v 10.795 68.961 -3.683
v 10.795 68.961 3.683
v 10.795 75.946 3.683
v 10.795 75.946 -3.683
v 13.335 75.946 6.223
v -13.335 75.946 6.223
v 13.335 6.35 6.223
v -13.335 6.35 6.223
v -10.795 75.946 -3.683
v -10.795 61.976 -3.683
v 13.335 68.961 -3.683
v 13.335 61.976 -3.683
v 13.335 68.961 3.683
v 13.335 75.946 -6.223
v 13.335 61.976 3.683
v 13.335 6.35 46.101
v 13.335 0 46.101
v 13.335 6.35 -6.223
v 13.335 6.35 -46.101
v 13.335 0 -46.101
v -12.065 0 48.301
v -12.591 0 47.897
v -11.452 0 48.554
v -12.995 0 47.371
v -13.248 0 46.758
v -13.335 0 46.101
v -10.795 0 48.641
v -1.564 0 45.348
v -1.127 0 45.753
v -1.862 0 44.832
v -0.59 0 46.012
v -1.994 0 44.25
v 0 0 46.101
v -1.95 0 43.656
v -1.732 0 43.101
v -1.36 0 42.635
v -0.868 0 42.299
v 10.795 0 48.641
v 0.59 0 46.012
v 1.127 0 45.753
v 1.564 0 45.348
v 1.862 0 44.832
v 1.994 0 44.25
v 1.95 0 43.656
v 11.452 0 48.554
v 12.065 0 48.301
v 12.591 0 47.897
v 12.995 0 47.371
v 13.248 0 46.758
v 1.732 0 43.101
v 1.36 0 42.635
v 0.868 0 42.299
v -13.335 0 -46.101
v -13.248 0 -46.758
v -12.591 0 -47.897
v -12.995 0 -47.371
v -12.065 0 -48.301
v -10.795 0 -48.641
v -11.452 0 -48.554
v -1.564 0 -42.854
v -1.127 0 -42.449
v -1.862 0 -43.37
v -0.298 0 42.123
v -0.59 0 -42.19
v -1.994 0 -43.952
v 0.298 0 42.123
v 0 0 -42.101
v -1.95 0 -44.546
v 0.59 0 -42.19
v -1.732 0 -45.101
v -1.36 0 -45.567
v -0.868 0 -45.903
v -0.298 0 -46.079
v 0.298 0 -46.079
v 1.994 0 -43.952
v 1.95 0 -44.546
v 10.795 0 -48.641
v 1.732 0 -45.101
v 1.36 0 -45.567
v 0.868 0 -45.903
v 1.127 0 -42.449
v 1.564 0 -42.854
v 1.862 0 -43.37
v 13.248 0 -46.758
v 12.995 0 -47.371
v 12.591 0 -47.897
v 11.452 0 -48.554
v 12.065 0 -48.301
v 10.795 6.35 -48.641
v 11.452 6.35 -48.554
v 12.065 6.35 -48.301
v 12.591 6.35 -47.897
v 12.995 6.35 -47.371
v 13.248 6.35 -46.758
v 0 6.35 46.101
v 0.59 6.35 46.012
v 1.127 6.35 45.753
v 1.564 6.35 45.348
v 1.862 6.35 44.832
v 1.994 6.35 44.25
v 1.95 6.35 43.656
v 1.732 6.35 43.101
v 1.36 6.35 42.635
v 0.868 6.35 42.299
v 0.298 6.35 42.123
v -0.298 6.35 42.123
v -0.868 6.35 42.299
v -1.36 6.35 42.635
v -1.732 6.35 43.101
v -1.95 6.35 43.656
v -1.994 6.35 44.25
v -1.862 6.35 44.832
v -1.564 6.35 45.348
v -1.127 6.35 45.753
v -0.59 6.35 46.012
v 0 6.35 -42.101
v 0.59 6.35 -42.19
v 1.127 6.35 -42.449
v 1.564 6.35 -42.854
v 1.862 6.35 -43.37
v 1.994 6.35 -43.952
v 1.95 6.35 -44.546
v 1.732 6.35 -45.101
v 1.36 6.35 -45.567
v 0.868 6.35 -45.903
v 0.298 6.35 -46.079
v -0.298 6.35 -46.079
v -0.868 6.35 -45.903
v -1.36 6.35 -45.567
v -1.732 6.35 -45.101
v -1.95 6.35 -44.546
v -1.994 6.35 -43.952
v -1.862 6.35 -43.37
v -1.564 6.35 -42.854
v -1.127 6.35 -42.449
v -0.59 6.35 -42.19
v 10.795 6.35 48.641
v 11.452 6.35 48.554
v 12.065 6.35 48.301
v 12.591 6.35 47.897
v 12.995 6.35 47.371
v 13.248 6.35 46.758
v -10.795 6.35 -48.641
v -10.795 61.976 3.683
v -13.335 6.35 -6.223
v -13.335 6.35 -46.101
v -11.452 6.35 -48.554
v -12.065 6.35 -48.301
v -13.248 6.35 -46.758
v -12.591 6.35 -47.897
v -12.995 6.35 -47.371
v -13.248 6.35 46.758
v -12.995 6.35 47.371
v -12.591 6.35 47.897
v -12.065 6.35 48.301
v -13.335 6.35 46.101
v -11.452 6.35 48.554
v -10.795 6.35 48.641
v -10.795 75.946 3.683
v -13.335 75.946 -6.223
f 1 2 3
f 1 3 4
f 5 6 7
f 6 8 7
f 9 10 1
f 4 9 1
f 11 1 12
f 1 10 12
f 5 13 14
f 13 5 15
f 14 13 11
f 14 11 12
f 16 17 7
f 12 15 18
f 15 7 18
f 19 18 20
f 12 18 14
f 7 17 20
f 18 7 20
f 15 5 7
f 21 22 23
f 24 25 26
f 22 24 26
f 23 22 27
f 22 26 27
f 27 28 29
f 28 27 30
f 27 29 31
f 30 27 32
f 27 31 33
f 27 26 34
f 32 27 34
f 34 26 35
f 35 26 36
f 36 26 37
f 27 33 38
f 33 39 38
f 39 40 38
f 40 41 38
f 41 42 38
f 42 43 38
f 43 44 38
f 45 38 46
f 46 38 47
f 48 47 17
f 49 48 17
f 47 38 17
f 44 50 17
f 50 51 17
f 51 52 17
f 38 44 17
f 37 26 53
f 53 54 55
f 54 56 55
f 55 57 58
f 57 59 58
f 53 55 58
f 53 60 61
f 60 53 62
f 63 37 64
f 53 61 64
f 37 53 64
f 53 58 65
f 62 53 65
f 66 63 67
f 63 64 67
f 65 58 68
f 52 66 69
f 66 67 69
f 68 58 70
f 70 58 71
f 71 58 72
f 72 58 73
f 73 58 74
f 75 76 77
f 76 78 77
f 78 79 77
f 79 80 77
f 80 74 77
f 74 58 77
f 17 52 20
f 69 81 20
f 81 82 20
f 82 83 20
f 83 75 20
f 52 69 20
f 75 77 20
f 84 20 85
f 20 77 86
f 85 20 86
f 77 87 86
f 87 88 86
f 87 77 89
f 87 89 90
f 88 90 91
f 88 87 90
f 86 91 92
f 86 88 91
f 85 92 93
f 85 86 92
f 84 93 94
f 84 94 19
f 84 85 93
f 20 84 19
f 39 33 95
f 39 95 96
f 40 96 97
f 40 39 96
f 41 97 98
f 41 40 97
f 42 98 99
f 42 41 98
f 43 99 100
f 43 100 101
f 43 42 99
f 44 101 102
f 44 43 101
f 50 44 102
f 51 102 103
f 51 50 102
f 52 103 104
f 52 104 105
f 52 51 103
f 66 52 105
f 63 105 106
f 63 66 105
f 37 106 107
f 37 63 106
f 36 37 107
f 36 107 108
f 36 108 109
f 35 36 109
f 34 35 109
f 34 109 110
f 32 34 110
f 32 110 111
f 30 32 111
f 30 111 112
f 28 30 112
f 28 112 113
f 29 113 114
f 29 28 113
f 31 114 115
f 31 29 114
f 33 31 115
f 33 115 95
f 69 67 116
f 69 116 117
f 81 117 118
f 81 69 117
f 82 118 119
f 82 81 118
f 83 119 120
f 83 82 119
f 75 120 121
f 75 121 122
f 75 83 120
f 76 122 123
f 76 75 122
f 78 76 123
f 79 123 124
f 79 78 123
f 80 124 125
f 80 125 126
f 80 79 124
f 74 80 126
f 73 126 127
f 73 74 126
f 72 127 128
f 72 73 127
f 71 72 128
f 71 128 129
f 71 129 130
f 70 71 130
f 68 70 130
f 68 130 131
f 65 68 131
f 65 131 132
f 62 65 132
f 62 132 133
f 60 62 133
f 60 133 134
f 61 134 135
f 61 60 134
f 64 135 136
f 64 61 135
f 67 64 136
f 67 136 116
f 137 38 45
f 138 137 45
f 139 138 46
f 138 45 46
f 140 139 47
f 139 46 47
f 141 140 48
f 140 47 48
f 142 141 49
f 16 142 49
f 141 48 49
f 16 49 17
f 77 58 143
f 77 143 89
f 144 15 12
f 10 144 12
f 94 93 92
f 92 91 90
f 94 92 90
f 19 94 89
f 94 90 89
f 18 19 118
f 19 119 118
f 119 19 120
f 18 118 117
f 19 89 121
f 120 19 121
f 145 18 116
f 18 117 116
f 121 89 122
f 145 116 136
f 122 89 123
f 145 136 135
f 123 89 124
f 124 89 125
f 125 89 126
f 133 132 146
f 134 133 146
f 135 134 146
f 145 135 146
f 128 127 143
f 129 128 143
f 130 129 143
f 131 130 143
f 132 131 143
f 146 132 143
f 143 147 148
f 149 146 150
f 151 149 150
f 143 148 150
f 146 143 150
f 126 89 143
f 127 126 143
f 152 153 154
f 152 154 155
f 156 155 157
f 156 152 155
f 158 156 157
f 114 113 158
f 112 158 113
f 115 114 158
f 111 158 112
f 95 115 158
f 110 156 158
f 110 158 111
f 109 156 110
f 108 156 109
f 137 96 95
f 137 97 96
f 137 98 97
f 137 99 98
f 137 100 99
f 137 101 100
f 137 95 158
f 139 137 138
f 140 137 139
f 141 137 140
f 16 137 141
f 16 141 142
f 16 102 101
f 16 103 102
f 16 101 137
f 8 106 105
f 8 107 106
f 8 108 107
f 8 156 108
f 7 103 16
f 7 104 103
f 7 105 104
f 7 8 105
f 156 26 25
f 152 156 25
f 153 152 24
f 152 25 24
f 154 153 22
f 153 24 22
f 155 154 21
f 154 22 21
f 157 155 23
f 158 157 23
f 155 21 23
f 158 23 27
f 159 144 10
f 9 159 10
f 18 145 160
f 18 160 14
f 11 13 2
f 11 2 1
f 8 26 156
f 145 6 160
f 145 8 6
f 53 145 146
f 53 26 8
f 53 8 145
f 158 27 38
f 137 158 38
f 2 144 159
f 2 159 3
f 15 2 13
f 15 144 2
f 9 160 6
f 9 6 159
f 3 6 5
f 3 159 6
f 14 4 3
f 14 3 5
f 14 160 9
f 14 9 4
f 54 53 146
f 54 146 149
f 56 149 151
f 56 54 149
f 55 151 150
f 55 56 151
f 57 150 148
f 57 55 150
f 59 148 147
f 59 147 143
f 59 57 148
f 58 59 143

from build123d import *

# Parameters (mm, degrees)
SKETCH1_R             = 2
BOSS_EXTRUDE1_DEPTH   = 6.35
BOSS_EXTRUDE1_2_DEPTH = 6.35
SKETCH1_3_W           = 26.67
SKETCH1_3_H           = 12.446
BOSS_EXTRUDE2_DEPTH   = 61.976
SKETCH2_W             = 26.67
SKETCH2_H             = 12.446
SKETCH2_W_2           = 21.59
SKETCH2_H_2           = 7.366
BOSS_EXTRUDE3_DEPTH   = 13.97
SKETCH3_W             = 7.366
SKETCH3_H             = 6.985
CUT_EXTRUDE1_DEPTH    = 13.97


with BuildPart() as part:
    # Sketch1 → Boss-Extrude1 (new body)
    with BuildSketch(Plane(origin=(0, 0, 0), x_dir=(1, 0, 0), z_dir=(0, 1, 0))):
        with BuildLine():
            Line((-13.335, 6.223), (13.335, 6.223))
            Line((13.335, 6.223), (13.335, 46.101))
            ThreePointArc((13.335, 46.101), (12.591051224, 47.897051224), (10.795, 48.641))
            Line((10.795, 48.641), (-10.795, 48.641))
            ThreePointArc((-10.795, 48.641), (-12.591051224, 47.897051224), (-13.335, 46.101))
            Line((-13.335, 46.101), (-13.335, 6.223))
        make_face()
        with Locations((0, 44.101004)):
            Circle(SKETCH1_R, mode=Mode.SUBTRACT)
    extrude(amount=BOSS_EXTRUDE1_DEPTH)



with BuildPart() as body_2:
    # Sketch1 → Boss-Extrude1 2 (new body)
    with BuildSketch(Plane(origin=(0, 0, 0), x_dir=(1, 0, 0), z_dir=(0, 1, 0))):
        with BuildLine():
            Line((13.335, -46.101), (13.335, -6.223))
            Line((13.335, -6.223), (-13.335, -6.223))
            Line((-13.335, -6.223), (-13.335, -46.101))
            ThreePointArc((-13.335, -46.101), (-12.591051224, -47.897051224), (-10.795, -48.641))
            Line((-10.795, -48.641), (10.795, -48.641))
            ThreePointArc((10.795, -48.641), (12.591051224, -47.897051224), (13.335, -46.101))
        make_face()
        with Locations((0, -44.101004)):
            Circle(SKETCH1_R, mode=Mode.SUBTRACT)
    extrude(amount=BOSS_EXTRUDE1_2_DEPTH)


with BuildPart() as part_1:
    add(part.part)

    add(body_2.part)  # Boss-Extrude2 merges body 2
    # Sketch1<3> → Boss-Extrude2 (add)
    with BuildSketch(Plane(origin=(0, 0, 0), x_dir=(1, 0, 0), z_dir=(0, 1, 0))):
        Rectangle(SKETCH1_3_W, SKETCH1_3_H)
    extrude(amount=BOSS_EXTRUDE2_DEPTH)

    # Sketch2 → Boss-Extrude3 (add)
    with BuildSketch(Plane(origin=(0, 61.976, 0), x_dir=(1, 0, 0), z_dir=(0, 1, 0))):
        Rectangle(SKETCH2_W, SKETCH2_H)
        Rectangle(SKETCH2_W_2, SKETCH2_H_2, mode=Mode.SUBTRACT)
    extrude(amount=BOSS_EXTRUDE3_DEPTH)

    # Sketch3 → Cut-Extrude1 (cut)
    with BuildSketch(Plane(origin=(13.335, 0, 0), x_dir=(0, 0, -1), z_dir=(1, 0, 0))):
        with Locations((0, 65.4685)):
            Rectangle(SKETCH3_W, SKETCH3_H)
    extrude(amount=-CUT_EXTRUDE1_DEPTH, mode=Mode.SUBTRACT)


solid = part_1.part
